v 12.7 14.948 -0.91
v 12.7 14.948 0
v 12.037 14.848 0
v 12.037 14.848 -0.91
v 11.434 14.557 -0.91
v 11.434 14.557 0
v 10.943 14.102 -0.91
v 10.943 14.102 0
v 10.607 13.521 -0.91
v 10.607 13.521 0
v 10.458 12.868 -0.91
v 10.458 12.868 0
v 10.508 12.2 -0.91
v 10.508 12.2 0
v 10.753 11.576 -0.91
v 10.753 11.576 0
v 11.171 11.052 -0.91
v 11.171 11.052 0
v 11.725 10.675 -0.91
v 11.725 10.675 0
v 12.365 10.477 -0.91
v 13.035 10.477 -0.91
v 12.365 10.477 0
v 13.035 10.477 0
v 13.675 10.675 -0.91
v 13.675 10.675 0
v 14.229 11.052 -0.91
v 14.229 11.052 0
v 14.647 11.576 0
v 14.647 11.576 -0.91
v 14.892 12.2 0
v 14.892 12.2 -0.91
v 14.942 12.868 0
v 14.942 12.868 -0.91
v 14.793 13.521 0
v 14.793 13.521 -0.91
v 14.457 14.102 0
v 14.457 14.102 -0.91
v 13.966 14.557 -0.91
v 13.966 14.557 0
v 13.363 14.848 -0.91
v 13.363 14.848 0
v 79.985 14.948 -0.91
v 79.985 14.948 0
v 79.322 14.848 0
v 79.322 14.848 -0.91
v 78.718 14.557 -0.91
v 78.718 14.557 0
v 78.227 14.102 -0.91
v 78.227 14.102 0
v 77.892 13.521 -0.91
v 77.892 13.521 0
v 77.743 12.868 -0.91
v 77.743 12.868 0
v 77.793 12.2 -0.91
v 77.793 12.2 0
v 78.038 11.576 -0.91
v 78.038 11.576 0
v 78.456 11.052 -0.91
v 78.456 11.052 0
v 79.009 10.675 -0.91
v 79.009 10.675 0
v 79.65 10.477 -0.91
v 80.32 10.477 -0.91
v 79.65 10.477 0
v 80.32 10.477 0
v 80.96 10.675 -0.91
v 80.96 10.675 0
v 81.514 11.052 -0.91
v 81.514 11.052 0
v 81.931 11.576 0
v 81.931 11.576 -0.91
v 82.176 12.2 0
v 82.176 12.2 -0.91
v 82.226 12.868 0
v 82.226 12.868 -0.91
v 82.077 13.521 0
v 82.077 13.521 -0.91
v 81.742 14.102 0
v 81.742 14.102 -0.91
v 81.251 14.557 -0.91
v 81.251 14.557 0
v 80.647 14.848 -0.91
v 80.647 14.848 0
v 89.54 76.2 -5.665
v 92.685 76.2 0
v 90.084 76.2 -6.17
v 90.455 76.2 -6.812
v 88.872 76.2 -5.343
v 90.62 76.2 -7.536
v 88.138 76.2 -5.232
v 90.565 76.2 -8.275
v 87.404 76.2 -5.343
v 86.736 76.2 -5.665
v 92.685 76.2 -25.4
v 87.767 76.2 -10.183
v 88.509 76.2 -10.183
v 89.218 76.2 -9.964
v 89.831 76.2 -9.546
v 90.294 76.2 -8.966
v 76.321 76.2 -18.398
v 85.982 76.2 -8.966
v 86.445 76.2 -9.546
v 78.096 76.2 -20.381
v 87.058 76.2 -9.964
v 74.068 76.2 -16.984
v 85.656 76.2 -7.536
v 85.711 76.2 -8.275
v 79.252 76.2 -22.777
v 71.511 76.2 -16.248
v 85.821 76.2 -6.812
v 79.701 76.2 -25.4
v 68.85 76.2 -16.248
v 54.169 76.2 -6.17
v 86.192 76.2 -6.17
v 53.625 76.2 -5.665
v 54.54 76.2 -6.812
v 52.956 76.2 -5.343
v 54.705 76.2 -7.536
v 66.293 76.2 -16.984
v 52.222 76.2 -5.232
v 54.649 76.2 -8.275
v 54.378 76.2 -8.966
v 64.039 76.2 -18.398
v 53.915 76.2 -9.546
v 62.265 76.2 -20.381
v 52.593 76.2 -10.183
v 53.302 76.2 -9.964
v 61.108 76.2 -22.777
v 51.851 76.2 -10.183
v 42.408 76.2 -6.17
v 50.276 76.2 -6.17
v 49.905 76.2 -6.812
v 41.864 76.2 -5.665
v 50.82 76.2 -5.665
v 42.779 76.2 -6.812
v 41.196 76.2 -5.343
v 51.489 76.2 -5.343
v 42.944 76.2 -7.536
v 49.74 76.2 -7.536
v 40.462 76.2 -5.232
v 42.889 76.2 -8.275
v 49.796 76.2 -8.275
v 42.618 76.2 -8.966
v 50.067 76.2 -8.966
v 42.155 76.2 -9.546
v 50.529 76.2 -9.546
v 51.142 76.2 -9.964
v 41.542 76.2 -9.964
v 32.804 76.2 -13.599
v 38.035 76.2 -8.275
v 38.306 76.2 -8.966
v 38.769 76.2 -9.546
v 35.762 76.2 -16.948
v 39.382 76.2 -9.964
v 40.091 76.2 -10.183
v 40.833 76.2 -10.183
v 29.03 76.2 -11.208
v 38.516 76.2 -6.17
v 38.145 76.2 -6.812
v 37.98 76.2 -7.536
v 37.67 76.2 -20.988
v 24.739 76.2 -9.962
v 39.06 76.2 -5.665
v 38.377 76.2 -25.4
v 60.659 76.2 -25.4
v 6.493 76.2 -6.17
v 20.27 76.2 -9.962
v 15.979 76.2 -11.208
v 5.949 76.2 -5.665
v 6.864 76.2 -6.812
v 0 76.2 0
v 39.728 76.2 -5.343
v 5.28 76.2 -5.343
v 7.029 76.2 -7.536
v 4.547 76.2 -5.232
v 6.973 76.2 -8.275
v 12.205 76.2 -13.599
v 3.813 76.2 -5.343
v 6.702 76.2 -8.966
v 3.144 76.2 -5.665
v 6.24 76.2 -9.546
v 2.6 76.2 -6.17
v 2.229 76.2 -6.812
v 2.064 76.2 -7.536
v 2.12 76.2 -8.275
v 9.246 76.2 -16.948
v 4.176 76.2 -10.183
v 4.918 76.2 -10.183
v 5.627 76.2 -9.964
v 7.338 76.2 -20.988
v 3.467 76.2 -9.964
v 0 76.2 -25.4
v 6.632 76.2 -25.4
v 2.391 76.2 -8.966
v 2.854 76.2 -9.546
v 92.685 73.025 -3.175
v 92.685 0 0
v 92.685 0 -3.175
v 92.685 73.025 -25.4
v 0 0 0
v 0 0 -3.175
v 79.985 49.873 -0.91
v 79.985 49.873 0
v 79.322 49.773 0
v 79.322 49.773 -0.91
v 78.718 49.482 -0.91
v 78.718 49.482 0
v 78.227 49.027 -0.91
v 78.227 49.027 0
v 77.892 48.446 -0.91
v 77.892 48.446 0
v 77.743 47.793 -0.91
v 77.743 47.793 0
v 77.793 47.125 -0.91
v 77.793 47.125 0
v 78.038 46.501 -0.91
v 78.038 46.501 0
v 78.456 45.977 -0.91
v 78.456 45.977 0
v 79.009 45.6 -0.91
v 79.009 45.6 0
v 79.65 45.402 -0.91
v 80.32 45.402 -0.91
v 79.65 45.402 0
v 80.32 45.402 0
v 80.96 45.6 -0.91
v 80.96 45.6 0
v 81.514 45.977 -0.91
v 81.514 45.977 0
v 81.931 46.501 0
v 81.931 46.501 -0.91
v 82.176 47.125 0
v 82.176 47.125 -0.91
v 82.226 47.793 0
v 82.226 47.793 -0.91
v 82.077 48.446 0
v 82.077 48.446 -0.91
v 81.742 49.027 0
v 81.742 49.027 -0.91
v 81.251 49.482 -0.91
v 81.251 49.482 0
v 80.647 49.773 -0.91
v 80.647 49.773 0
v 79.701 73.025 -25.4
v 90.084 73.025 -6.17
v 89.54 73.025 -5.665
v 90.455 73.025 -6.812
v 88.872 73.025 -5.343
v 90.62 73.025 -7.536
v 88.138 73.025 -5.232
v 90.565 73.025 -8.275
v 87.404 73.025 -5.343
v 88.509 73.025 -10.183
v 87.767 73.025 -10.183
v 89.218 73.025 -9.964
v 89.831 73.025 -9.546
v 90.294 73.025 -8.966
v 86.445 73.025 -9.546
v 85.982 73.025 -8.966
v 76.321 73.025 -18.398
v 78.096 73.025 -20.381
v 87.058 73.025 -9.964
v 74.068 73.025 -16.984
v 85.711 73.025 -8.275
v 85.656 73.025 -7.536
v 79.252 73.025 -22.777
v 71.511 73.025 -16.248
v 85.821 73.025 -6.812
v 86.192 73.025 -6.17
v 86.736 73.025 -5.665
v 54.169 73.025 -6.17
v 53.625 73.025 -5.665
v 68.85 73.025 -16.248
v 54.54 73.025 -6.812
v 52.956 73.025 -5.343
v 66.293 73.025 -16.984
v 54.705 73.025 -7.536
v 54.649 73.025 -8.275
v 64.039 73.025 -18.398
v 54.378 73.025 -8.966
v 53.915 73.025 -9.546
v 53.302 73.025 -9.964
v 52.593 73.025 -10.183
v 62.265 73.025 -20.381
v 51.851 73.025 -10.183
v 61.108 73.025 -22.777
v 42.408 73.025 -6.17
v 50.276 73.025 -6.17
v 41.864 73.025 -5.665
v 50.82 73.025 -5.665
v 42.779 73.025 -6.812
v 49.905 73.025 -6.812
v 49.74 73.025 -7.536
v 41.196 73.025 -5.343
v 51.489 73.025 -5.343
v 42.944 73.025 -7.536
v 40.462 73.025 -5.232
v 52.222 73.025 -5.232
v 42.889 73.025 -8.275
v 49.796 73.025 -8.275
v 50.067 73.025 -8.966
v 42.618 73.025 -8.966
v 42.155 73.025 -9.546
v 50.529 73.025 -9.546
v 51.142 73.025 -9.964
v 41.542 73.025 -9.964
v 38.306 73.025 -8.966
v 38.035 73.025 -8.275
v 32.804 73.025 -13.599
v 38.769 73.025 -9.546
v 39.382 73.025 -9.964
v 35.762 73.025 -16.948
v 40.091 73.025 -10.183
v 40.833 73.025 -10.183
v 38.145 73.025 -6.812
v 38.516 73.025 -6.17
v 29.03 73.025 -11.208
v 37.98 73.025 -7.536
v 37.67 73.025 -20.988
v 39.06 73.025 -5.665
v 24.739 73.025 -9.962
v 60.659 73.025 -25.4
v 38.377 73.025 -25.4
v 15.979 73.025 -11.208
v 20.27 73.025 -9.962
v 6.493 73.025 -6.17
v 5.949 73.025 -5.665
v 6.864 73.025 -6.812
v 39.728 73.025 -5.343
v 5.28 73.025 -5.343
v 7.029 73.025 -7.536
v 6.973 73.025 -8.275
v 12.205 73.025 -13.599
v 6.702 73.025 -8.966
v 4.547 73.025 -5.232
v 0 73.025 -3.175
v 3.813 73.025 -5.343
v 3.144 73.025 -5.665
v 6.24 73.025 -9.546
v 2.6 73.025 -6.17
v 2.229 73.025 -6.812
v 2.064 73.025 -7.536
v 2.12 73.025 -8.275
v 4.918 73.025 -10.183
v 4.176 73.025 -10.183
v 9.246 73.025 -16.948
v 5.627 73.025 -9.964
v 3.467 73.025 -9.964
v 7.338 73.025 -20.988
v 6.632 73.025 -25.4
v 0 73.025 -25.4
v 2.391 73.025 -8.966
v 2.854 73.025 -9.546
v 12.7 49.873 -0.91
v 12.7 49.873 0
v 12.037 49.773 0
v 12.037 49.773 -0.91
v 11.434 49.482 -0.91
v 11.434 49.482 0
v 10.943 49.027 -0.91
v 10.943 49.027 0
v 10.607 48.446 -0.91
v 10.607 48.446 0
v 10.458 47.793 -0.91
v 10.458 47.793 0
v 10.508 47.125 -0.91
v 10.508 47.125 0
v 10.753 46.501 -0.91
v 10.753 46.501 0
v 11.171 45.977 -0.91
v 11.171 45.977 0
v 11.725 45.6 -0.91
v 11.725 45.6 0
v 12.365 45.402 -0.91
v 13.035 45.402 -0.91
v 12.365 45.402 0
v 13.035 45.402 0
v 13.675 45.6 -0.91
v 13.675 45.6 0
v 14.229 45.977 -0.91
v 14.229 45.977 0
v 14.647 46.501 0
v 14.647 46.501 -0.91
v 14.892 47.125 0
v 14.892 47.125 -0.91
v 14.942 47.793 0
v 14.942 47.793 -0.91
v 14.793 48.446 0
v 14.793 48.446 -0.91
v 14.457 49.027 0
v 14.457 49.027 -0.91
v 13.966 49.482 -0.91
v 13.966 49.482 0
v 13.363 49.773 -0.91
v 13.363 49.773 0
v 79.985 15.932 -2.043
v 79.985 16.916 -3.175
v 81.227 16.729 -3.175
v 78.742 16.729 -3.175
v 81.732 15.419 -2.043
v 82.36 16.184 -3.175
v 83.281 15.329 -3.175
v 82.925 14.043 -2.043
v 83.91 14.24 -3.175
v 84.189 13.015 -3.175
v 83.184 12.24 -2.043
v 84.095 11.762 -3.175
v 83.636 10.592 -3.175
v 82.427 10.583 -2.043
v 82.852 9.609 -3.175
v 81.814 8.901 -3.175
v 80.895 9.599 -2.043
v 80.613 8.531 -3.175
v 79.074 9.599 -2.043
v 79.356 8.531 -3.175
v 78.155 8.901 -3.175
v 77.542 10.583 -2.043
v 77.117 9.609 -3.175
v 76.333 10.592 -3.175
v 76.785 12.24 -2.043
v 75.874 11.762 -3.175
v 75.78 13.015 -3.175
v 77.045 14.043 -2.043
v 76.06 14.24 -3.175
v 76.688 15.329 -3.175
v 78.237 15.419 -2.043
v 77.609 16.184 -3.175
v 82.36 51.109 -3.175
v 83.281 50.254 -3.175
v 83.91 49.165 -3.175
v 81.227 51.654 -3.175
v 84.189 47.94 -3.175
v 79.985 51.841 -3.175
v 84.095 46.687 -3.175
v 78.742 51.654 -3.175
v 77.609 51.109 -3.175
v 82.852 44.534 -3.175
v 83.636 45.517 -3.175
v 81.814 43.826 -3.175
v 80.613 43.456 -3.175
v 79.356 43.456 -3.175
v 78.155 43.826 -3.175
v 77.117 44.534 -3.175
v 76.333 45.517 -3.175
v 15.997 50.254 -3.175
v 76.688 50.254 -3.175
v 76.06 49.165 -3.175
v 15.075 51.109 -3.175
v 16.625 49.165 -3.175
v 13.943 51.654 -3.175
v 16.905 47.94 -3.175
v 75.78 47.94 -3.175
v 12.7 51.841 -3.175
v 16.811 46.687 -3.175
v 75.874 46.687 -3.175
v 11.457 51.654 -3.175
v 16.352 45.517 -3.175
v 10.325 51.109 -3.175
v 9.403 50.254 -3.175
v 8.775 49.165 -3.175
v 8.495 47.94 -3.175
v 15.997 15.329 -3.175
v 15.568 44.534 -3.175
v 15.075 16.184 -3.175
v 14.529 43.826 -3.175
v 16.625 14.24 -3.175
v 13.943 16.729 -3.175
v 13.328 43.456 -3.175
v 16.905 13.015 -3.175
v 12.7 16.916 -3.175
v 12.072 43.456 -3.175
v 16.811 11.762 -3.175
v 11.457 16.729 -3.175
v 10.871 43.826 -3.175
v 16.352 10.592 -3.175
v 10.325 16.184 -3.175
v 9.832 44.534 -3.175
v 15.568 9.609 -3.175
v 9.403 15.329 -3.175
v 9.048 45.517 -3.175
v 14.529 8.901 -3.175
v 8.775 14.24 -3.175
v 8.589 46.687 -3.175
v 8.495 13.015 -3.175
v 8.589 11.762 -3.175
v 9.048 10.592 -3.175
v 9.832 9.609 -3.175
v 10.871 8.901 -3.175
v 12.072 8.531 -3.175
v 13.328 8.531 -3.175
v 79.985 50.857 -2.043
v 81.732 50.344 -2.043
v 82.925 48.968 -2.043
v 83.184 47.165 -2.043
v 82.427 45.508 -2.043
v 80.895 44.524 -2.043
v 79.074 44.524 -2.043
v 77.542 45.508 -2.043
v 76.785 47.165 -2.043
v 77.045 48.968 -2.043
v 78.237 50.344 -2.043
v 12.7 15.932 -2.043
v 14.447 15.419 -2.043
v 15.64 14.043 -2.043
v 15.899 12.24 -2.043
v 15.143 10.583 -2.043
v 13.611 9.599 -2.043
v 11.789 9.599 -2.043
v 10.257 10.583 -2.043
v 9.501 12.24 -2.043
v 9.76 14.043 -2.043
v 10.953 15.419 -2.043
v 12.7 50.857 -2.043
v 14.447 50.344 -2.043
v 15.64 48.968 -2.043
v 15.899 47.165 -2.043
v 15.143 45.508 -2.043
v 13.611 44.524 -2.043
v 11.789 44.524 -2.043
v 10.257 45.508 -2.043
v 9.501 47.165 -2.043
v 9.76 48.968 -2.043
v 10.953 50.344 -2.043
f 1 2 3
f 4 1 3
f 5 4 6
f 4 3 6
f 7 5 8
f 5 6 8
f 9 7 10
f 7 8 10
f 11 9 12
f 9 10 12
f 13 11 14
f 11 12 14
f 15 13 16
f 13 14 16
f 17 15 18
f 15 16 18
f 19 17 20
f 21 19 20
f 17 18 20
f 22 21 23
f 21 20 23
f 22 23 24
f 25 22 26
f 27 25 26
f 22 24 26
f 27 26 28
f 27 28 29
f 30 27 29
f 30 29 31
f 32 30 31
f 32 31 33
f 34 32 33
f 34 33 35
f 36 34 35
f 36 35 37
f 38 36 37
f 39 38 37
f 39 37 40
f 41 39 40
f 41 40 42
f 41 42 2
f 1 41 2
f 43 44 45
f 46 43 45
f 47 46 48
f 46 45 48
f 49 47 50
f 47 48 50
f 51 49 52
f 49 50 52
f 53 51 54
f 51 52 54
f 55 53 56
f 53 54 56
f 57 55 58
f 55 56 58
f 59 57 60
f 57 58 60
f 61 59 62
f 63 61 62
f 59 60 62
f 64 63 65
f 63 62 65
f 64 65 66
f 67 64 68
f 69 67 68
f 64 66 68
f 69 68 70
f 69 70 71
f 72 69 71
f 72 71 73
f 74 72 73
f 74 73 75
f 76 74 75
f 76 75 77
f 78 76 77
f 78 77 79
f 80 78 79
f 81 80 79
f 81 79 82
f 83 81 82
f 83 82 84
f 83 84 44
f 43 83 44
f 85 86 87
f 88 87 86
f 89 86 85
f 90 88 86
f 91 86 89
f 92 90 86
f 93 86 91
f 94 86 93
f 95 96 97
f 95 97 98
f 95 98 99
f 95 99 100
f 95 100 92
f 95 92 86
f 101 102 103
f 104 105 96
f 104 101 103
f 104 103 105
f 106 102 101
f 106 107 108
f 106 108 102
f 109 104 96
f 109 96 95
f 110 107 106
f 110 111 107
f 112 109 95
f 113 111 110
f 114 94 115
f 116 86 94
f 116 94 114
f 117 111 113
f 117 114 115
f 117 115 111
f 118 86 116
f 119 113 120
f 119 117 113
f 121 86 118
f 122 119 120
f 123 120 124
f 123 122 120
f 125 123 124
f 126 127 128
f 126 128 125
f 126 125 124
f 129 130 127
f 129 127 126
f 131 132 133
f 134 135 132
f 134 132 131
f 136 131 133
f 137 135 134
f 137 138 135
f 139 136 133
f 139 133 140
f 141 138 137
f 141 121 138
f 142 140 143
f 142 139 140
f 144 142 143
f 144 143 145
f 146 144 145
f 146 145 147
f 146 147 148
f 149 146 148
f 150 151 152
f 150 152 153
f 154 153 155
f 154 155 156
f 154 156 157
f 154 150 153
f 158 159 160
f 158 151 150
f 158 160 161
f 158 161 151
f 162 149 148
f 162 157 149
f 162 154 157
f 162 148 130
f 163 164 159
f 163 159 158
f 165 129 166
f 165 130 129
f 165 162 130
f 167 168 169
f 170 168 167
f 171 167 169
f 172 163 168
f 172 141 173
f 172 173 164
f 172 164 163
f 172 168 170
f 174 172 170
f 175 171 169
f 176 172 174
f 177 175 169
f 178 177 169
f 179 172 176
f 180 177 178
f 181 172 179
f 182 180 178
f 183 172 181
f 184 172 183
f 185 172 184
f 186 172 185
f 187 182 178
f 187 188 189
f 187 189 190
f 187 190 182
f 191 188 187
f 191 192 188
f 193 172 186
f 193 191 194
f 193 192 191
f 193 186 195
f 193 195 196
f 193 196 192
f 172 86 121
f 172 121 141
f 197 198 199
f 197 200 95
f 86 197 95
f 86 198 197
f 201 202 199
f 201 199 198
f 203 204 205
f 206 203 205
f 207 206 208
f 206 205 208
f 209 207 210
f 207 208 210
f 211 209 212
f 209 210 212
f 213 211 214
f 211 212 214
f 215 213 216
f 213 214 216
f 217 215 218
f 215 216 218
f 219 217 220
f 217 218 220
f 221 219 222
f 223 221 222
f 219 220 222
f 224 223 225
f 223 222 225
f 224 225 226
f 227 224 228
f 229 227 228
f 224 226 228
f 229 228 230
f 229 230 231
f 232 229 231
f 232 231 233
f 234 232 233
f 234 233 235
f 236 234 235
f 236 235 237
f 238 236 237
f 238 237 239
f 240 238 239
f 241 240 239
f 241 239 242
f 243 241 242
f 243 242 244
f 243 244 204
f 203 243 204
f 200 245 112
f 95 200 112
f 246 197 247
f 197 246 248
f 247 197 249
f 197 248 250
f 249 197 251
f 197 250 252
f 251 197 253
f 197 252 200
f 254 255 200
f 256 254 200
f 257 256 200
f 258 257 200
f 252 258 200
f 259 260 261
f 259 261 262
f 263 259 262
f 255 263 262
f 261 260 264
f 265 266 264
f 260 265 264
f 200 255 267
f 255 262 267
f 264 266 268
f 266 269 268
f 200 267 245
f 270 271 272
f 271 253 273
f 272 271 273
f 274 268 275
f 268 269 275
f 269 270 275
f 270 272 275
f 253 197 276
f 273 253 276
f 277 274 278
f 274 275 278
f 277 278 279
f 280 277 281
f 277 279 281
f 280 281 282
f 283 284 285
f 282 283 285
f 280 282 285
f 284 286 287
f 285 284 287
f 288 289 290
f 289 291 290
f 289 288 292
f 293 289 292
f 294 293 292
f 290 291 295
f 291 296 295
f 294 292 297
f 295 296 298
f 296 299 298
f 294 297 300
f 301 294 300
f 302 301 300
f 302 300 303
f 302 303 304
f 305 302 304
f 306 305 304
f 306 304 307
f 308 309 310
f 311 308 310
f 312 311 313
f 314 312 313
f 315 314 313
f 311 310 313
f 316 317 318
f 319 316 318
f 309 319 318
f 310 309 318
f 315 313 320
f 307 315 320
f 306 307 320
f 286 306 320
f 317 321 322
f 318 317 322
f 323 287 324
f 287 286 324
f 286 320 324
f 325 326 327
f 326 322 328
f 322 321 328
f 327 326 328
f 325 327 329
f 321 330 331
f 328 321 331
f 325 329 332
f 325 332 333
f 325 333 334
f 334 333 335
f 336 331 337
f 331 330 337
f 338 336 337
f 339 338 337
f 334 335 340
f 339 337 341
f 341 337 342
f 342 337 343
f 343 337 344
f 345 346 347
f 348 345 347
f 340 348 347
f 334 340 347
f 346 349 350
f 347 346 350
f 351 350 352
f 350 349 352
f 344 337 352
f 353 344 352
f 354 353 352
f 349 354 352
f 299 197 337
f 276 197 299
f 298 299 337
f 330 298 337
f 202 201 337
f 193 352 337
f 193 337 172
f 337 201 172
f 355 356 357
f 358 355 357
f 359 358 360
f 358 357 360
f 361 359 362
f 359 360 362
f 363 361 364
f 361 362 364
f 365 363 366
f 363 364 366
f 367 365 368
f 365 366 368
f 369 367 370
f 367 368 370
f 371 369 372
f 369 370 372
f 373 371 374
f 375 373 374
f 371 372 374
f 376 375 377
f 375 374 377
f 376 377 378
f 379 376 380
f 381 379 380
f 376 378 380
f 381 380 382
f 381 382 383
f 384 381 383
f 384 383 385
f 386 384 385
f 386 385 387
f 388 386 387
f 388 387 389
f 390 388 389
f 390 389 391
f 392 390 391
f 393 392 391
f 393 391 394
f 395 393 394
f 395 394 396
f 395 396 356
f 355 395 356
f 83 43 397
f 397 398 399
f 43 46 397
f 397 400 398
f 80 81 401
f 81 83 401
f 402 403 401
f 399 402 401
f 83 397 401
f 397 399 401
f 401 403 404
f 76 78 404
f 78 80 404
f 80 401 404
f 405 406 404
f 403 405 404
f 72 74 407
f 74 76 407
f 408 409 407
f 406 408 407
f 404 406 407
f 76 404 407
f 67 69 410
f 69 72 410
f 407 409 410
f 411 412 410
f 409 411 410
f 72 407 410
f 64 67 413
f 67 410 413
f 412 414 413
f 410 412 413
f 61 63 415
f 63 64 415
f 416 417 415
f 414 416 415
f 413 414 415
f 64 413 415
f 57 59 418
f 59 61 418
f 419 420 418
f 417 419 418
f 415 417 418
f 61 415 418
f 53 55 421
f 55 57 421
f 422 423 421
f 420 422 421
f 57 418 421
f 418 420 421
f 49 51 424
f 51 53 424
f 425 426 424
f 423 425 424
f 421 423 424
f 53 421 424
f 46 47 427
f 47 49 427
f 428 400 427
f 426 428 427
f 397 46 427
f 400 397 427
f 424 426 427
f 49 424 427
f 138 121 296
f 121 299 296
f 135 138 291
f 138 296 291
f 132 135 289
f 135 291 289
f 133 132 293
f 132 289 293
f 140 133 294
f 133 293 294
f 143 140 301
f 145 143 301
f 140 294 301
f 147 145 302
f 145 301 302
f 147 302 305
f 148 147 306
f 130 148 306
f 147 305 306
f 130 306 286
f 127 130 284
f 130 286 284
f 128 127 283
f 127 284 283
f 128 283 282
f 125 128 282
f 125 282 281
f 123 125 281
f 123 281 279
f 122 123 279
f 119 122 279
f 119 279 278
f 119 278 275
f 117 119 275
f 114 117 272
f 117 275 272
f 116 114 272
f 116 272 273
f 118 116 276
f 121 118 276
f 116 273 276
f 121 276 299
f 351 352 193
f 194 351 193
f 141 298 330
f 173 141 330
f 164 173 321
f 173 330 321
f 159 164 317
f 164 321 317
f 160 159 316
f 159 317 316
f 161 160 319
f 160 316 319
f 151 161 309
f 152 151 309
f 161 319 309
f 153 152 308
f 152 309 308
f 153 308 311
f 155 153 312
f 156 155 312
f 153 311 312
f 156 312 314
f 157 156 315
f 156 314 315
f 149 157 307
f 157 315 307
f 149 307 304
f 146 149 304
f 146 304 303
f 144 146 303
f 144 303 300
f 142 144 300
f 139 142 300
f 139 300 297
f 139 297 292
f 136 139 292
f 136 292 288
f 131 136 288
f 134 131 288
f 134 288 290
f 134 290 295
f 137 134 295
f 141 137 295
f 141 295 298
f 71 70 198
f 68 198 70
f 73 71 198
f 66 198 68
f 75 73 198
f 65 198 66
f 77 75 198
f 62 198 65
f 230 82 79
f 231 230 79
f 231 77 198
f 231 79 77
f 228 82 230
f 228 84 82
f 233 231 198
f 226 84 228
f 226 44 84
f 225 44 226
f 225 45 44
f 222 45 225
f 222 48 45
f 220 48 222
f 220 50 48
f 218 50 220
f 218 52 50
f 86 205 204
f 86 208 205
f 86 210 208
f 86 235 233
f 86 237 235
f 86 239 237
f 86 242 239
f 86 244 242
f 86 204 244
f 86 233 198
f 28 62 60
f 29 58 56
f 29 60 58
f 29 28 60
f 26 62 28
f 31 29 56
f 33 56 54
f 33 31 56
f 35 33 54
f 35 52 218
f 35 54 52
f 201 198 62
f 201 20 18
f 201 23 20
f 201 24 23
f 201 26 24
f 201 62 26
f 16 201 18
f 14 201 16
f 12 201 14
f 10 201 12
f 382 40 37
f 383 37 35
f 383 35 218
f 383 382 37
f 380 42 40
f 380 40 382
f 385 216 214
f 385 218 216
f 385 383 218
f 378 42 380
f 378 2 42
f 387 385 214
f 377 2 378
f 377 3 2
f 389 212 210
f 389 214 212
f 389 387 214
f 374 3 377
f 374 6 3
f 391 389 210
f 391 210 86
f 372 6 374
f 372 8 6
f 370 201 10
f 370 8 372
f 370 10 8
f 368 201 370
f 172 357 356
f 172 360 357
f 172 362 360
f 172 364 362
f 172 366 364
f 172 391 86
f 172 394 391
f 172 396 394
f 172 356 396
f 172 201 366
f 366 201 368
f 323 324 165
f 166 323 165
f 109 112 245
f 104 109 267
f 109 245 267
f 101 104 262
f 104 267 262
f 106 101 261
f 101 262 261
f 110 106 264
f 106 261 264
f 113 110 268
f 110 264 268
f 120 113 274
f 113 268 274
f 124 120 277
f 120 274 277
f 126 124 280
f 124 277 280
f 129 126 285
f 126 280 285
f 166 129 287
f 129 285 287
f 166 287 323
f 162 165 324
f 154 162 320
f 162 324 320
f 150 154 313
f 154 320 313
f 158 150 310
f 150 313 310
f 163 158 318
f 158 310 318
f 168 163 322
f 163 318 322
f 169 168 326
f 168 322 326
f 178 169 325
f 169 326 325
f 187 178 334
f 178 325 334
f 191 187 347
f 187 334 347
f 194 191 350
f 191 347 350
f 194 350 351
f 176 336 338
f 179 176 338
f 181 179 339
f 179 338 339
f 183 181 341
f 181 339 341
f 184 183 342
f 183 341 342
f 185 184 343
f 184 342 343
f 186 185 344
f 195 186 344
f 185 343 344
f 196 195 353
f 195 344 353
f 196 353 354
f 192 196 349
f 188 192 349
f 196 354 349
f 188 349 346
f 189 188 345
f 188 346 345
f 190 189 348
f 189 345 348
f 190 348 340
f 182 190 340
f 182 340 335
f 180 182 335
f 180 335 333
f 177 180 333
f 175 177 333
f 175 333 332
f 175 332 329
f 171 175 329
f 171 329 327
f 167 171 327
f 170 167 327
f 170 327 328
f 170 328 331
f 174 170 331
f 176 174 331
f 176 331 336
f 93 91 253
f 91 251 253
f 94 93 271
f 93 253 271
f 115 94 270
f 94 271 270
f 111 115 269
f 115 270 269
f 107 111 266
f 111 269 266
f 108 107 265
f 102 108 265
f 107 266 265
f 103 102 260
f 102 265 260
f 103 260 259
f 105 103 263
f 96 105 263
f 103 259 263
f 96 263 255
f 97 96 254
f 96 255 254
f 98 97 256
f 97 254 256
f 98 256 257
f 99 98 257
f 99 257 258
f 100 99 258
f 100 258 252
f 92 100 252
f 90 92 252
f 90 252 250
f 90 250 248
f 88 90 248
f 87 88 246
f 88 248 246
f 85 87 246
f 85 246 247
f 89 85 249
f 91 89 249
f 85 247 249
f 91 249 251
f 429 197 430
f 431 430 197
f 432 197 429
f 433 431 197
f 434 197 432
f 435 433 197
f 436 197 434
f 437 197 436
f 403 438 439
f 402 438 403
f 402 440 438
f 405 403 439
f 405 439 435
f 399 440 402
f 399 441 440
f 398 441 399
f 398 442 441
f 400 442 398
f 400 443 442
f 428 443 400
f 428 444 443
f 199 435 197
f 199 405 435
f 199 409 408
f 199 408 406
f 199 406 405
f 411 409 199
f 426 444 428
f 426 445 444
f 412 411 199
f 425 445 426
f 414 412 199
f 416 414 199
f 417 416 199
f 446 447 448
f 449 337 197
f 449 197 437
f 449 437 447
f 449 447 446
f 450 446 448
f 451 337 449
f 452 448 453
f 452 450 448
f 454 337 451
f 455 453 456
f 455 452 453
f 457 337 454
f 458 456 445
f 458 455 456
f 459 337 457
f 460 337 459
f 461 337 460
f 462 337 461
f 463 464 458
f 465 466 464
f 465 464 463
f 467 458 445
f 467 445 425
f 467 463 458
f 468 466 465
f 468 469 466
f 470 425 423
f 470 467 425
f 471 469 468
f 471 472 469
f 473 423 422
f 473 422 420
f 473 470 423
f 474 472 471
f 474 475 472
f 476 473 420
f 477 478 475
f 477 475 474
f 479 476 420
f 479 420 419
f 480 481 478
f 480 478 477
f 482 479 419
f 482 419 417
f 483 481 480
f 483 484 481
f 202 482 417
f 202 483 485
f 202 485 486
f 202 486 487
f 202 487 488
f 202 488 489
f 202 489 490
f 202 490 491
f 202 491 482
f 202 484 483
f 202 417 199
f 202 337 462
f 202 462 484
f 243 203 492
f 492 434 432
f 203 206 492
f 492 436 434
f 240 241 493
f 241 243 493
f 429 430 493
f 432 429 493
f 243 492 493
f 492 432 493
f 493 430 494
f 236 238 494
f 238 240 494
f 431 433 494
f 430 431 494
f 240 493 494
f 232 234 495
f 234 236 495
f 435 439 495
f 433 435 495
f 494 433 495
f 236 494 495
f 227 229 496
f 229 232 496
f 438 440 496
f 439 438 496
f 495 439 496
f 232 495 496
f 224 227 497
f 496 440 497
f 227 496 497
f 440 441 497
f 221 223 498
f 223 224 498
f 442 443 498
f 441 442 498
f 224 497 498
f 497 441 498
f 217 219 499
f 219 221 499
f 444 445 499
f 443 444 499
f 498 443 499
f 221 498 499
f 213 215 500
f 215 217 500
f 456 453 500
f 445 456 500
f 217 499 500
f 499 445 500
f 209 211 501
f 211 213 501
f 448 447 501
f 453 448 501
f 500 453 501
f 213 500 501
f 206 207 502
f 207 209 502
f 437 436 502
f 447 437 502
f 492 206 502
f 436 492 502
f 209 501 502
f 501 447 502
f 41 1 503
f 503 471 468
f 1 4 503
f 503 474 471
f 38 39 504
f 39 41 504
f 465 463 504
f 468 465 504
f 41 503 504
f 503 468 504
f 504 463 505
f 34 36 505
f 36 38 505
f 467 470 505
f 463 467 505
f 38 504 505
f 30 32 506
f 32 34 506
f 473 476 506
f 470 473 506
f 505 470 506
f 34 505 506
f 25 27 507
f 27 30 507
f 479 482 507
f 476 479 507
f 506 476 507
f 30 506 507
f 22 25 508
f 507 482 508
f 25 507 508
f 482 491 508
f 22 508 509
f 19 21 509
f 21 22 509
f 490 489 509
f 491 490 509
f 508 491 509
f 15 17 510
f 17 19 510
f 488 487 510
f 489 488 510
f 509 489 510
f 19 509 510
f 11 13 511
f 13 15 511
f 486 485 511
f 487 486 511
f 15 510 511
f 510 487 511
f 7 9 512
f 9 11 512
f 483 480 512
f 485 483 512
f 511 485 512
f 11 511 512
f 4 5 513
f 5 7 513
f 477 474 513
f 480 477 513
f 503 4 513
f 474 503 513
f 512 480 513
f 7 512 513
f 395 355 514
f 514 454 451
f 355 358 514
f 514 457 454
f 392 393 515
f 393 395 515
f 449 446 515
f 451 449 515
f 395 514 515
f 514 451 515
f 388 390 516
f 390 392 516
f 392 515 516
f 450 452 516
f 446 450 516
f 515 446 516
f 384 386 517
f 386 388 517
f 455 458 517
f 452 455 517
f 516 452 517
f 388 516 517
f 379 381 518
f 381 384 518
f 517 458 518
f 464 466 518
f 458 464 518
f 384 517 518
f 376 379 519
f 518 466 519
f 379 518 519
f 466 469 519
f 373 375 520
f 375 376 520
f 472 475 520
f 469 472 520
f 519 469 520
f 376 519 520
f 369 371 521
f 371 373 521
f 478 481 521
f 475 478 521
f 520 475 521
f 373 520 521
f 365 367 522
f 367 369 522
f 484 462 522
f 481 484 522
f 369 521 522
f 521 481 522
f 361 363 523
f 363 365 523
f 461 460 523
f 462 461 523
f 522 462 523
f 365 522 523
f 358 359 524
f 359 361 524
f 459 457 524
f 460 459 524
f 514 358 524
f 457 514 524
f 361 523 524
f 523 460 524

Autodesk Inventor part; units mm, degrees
ref_plane "YZ Plane" through (0, 0, 0) normal (1, 0, 0) x (0, 1, 0)
ref_plane "XZ Plane" through (0, 0, 0) normal (0, 1, 0) x (-1, 0, 0)
ref_plane "XY Plane" through (0, 0, 0) normal (0, 0, 1) x (1, 0, 0)
sketch "Sketch1" plane through (0, 0, 0) normal (1, 0, 0) x (0, 1, 0)
  line L0 (0, 0) -> (76.2, 0)
  line L1 (76.2, 0) -> (76.2, -3.175)
  line L2 (76.2, -3.175) -> (0, -3.175)
  line L3 (0, -3.175) -> (0, 0)
  line L4 (76.2, 0) -> (73.025, 0)
  line L5 (73.025, 0) -> (73.025, -25.4)
  line L6 (73.025, -25.4) -> (76.2, -25.4)
  line L7 (76.2, -25.4) -> (76.2, 0)
  dimension "d0" = 76.2
  dimension "d1" = 3.175
  dimension "d2" = 3.175
  dimension "d3" = 25.4
extrude "Extrusion1" add sketch "Sketch1" along normal blind 92.6846
sketch "Sketch2" plane through (0, 76.2, 0) normal (0, 1, 0) x (1, 0, 0)
  line L0 (0, 0) -> (92.6846, 0) projected
  line L1 (0, 25.4) -> (0, 0) projected
  line L2 (46.3423, -68.8852) -> (46.3423, 85.7759) construction
  point P0 (4.5466, 7.7216)
  point P1 (40.4622, 7.7216)
  point P2 (88.138, 7.7216)
  point P3 (52.2224, 7.7216)
  dimension "d6" = 7.7216
  dimension "d7" = 4.5466
  dimension "d8" = 0
  dimension "d9" = 35.9156
  dimension "d27" = 92.6846
  dimension "d28" = 46.3423
hole "Hole1" at (4.5466, 76.2, -7.7216) at (40.4622, 76.2, -7.7216) at (88.138, 76.2, -7.7216) at (52.2224, 76.2, -7.7216) direction (0, -1, 0) diameter 4.9784 depth 25.4 tip angle 118
sketch "Sketch3" plane through (0, 76.2, 0) normal (0, 1, 0) x (1, 0, 0)
  circle A0 centre (22.5044, 25.6794) radius 14.2875 construction
  circle A1 centre (40.4622, 7.7216) radius 2.4892 construction
  point P0 (0, 0)
  dimension "d17" = 28.575
  dimension "d18" = 17.9578
  dimension "d19" = 17.9578
hole "Hole2" at (22.5044, 76.2, -25.6794) direction (0, -1, 0) diameter 31.75 depth 25.4 tip angle 118
sketch "Sketch4" plane through (0, 76.2, 0) normal (0, 1, 0) x (1, 0, 0)
  circle A0 centre (88.138, 7.7216) radius 2.4892 projected
  point P0 (0, 0)
  point P1 (70.1802, 25.6794)
  dimension "d29" = 17.9578
  dimension "d30" = 17.9578
hole "Hole3" at (70.1802, 76.2, -25.6794) direction (0, -1, 0) diameter 19.05 depth 25.4 tip angle 118
sketch "Sketch5" plane through (0, 0, -3.175) normal (0, 0, -1) x (-1, 0, 0)
  line L0 (0, 0) -> (-92.6846, 0) projected
  line L1 (-92.6846, 0) -> (-92.6846, 73.025) projected
  line L2 (0, 0) -> (0, 73.025) projected
  line L3 (0, 73.025) -> (-6.6319, 73.025) projected
  line L4 (-79.7011, 73.025) -> (-92.6846, 73.025) projected
  point P0 (-79.9846, 47.625)
  point P1 (-12.7, 47.625)
  point P2 (-12.7, 12.7)
  point P3 (-79.9846, 12.7)
  dimension "d38" = 12.7
  dimension "d39" = 12.7
  dimension "d40" = 12.7
  dimension "d41" = 12.7
  dimension "d42" = 12.7
  dimension "d43" = 25.4
  dimension "d44" = 25.4
  dimension "d45" = 12.7
hole "Hole4" at (79.9846, 47.625, -3.175) at (12.7, 47.625, -3.175) at (12.7, 12.7, -3.175) at (79.9846, 12.7, -3.175) direction (0, 0, 1) diameter 4.4958 end through all countersink diameter 8.4328 countersink angle 82 clearance for "Flat Head Machine Screw (82)" size "#8" standard "Ansi Unified Screw Threads"
equation "\"d28\" = 0.5 * d27"
properties part number "CAR_044_180VersaLBracketMount" material "Aluminum 6061"
